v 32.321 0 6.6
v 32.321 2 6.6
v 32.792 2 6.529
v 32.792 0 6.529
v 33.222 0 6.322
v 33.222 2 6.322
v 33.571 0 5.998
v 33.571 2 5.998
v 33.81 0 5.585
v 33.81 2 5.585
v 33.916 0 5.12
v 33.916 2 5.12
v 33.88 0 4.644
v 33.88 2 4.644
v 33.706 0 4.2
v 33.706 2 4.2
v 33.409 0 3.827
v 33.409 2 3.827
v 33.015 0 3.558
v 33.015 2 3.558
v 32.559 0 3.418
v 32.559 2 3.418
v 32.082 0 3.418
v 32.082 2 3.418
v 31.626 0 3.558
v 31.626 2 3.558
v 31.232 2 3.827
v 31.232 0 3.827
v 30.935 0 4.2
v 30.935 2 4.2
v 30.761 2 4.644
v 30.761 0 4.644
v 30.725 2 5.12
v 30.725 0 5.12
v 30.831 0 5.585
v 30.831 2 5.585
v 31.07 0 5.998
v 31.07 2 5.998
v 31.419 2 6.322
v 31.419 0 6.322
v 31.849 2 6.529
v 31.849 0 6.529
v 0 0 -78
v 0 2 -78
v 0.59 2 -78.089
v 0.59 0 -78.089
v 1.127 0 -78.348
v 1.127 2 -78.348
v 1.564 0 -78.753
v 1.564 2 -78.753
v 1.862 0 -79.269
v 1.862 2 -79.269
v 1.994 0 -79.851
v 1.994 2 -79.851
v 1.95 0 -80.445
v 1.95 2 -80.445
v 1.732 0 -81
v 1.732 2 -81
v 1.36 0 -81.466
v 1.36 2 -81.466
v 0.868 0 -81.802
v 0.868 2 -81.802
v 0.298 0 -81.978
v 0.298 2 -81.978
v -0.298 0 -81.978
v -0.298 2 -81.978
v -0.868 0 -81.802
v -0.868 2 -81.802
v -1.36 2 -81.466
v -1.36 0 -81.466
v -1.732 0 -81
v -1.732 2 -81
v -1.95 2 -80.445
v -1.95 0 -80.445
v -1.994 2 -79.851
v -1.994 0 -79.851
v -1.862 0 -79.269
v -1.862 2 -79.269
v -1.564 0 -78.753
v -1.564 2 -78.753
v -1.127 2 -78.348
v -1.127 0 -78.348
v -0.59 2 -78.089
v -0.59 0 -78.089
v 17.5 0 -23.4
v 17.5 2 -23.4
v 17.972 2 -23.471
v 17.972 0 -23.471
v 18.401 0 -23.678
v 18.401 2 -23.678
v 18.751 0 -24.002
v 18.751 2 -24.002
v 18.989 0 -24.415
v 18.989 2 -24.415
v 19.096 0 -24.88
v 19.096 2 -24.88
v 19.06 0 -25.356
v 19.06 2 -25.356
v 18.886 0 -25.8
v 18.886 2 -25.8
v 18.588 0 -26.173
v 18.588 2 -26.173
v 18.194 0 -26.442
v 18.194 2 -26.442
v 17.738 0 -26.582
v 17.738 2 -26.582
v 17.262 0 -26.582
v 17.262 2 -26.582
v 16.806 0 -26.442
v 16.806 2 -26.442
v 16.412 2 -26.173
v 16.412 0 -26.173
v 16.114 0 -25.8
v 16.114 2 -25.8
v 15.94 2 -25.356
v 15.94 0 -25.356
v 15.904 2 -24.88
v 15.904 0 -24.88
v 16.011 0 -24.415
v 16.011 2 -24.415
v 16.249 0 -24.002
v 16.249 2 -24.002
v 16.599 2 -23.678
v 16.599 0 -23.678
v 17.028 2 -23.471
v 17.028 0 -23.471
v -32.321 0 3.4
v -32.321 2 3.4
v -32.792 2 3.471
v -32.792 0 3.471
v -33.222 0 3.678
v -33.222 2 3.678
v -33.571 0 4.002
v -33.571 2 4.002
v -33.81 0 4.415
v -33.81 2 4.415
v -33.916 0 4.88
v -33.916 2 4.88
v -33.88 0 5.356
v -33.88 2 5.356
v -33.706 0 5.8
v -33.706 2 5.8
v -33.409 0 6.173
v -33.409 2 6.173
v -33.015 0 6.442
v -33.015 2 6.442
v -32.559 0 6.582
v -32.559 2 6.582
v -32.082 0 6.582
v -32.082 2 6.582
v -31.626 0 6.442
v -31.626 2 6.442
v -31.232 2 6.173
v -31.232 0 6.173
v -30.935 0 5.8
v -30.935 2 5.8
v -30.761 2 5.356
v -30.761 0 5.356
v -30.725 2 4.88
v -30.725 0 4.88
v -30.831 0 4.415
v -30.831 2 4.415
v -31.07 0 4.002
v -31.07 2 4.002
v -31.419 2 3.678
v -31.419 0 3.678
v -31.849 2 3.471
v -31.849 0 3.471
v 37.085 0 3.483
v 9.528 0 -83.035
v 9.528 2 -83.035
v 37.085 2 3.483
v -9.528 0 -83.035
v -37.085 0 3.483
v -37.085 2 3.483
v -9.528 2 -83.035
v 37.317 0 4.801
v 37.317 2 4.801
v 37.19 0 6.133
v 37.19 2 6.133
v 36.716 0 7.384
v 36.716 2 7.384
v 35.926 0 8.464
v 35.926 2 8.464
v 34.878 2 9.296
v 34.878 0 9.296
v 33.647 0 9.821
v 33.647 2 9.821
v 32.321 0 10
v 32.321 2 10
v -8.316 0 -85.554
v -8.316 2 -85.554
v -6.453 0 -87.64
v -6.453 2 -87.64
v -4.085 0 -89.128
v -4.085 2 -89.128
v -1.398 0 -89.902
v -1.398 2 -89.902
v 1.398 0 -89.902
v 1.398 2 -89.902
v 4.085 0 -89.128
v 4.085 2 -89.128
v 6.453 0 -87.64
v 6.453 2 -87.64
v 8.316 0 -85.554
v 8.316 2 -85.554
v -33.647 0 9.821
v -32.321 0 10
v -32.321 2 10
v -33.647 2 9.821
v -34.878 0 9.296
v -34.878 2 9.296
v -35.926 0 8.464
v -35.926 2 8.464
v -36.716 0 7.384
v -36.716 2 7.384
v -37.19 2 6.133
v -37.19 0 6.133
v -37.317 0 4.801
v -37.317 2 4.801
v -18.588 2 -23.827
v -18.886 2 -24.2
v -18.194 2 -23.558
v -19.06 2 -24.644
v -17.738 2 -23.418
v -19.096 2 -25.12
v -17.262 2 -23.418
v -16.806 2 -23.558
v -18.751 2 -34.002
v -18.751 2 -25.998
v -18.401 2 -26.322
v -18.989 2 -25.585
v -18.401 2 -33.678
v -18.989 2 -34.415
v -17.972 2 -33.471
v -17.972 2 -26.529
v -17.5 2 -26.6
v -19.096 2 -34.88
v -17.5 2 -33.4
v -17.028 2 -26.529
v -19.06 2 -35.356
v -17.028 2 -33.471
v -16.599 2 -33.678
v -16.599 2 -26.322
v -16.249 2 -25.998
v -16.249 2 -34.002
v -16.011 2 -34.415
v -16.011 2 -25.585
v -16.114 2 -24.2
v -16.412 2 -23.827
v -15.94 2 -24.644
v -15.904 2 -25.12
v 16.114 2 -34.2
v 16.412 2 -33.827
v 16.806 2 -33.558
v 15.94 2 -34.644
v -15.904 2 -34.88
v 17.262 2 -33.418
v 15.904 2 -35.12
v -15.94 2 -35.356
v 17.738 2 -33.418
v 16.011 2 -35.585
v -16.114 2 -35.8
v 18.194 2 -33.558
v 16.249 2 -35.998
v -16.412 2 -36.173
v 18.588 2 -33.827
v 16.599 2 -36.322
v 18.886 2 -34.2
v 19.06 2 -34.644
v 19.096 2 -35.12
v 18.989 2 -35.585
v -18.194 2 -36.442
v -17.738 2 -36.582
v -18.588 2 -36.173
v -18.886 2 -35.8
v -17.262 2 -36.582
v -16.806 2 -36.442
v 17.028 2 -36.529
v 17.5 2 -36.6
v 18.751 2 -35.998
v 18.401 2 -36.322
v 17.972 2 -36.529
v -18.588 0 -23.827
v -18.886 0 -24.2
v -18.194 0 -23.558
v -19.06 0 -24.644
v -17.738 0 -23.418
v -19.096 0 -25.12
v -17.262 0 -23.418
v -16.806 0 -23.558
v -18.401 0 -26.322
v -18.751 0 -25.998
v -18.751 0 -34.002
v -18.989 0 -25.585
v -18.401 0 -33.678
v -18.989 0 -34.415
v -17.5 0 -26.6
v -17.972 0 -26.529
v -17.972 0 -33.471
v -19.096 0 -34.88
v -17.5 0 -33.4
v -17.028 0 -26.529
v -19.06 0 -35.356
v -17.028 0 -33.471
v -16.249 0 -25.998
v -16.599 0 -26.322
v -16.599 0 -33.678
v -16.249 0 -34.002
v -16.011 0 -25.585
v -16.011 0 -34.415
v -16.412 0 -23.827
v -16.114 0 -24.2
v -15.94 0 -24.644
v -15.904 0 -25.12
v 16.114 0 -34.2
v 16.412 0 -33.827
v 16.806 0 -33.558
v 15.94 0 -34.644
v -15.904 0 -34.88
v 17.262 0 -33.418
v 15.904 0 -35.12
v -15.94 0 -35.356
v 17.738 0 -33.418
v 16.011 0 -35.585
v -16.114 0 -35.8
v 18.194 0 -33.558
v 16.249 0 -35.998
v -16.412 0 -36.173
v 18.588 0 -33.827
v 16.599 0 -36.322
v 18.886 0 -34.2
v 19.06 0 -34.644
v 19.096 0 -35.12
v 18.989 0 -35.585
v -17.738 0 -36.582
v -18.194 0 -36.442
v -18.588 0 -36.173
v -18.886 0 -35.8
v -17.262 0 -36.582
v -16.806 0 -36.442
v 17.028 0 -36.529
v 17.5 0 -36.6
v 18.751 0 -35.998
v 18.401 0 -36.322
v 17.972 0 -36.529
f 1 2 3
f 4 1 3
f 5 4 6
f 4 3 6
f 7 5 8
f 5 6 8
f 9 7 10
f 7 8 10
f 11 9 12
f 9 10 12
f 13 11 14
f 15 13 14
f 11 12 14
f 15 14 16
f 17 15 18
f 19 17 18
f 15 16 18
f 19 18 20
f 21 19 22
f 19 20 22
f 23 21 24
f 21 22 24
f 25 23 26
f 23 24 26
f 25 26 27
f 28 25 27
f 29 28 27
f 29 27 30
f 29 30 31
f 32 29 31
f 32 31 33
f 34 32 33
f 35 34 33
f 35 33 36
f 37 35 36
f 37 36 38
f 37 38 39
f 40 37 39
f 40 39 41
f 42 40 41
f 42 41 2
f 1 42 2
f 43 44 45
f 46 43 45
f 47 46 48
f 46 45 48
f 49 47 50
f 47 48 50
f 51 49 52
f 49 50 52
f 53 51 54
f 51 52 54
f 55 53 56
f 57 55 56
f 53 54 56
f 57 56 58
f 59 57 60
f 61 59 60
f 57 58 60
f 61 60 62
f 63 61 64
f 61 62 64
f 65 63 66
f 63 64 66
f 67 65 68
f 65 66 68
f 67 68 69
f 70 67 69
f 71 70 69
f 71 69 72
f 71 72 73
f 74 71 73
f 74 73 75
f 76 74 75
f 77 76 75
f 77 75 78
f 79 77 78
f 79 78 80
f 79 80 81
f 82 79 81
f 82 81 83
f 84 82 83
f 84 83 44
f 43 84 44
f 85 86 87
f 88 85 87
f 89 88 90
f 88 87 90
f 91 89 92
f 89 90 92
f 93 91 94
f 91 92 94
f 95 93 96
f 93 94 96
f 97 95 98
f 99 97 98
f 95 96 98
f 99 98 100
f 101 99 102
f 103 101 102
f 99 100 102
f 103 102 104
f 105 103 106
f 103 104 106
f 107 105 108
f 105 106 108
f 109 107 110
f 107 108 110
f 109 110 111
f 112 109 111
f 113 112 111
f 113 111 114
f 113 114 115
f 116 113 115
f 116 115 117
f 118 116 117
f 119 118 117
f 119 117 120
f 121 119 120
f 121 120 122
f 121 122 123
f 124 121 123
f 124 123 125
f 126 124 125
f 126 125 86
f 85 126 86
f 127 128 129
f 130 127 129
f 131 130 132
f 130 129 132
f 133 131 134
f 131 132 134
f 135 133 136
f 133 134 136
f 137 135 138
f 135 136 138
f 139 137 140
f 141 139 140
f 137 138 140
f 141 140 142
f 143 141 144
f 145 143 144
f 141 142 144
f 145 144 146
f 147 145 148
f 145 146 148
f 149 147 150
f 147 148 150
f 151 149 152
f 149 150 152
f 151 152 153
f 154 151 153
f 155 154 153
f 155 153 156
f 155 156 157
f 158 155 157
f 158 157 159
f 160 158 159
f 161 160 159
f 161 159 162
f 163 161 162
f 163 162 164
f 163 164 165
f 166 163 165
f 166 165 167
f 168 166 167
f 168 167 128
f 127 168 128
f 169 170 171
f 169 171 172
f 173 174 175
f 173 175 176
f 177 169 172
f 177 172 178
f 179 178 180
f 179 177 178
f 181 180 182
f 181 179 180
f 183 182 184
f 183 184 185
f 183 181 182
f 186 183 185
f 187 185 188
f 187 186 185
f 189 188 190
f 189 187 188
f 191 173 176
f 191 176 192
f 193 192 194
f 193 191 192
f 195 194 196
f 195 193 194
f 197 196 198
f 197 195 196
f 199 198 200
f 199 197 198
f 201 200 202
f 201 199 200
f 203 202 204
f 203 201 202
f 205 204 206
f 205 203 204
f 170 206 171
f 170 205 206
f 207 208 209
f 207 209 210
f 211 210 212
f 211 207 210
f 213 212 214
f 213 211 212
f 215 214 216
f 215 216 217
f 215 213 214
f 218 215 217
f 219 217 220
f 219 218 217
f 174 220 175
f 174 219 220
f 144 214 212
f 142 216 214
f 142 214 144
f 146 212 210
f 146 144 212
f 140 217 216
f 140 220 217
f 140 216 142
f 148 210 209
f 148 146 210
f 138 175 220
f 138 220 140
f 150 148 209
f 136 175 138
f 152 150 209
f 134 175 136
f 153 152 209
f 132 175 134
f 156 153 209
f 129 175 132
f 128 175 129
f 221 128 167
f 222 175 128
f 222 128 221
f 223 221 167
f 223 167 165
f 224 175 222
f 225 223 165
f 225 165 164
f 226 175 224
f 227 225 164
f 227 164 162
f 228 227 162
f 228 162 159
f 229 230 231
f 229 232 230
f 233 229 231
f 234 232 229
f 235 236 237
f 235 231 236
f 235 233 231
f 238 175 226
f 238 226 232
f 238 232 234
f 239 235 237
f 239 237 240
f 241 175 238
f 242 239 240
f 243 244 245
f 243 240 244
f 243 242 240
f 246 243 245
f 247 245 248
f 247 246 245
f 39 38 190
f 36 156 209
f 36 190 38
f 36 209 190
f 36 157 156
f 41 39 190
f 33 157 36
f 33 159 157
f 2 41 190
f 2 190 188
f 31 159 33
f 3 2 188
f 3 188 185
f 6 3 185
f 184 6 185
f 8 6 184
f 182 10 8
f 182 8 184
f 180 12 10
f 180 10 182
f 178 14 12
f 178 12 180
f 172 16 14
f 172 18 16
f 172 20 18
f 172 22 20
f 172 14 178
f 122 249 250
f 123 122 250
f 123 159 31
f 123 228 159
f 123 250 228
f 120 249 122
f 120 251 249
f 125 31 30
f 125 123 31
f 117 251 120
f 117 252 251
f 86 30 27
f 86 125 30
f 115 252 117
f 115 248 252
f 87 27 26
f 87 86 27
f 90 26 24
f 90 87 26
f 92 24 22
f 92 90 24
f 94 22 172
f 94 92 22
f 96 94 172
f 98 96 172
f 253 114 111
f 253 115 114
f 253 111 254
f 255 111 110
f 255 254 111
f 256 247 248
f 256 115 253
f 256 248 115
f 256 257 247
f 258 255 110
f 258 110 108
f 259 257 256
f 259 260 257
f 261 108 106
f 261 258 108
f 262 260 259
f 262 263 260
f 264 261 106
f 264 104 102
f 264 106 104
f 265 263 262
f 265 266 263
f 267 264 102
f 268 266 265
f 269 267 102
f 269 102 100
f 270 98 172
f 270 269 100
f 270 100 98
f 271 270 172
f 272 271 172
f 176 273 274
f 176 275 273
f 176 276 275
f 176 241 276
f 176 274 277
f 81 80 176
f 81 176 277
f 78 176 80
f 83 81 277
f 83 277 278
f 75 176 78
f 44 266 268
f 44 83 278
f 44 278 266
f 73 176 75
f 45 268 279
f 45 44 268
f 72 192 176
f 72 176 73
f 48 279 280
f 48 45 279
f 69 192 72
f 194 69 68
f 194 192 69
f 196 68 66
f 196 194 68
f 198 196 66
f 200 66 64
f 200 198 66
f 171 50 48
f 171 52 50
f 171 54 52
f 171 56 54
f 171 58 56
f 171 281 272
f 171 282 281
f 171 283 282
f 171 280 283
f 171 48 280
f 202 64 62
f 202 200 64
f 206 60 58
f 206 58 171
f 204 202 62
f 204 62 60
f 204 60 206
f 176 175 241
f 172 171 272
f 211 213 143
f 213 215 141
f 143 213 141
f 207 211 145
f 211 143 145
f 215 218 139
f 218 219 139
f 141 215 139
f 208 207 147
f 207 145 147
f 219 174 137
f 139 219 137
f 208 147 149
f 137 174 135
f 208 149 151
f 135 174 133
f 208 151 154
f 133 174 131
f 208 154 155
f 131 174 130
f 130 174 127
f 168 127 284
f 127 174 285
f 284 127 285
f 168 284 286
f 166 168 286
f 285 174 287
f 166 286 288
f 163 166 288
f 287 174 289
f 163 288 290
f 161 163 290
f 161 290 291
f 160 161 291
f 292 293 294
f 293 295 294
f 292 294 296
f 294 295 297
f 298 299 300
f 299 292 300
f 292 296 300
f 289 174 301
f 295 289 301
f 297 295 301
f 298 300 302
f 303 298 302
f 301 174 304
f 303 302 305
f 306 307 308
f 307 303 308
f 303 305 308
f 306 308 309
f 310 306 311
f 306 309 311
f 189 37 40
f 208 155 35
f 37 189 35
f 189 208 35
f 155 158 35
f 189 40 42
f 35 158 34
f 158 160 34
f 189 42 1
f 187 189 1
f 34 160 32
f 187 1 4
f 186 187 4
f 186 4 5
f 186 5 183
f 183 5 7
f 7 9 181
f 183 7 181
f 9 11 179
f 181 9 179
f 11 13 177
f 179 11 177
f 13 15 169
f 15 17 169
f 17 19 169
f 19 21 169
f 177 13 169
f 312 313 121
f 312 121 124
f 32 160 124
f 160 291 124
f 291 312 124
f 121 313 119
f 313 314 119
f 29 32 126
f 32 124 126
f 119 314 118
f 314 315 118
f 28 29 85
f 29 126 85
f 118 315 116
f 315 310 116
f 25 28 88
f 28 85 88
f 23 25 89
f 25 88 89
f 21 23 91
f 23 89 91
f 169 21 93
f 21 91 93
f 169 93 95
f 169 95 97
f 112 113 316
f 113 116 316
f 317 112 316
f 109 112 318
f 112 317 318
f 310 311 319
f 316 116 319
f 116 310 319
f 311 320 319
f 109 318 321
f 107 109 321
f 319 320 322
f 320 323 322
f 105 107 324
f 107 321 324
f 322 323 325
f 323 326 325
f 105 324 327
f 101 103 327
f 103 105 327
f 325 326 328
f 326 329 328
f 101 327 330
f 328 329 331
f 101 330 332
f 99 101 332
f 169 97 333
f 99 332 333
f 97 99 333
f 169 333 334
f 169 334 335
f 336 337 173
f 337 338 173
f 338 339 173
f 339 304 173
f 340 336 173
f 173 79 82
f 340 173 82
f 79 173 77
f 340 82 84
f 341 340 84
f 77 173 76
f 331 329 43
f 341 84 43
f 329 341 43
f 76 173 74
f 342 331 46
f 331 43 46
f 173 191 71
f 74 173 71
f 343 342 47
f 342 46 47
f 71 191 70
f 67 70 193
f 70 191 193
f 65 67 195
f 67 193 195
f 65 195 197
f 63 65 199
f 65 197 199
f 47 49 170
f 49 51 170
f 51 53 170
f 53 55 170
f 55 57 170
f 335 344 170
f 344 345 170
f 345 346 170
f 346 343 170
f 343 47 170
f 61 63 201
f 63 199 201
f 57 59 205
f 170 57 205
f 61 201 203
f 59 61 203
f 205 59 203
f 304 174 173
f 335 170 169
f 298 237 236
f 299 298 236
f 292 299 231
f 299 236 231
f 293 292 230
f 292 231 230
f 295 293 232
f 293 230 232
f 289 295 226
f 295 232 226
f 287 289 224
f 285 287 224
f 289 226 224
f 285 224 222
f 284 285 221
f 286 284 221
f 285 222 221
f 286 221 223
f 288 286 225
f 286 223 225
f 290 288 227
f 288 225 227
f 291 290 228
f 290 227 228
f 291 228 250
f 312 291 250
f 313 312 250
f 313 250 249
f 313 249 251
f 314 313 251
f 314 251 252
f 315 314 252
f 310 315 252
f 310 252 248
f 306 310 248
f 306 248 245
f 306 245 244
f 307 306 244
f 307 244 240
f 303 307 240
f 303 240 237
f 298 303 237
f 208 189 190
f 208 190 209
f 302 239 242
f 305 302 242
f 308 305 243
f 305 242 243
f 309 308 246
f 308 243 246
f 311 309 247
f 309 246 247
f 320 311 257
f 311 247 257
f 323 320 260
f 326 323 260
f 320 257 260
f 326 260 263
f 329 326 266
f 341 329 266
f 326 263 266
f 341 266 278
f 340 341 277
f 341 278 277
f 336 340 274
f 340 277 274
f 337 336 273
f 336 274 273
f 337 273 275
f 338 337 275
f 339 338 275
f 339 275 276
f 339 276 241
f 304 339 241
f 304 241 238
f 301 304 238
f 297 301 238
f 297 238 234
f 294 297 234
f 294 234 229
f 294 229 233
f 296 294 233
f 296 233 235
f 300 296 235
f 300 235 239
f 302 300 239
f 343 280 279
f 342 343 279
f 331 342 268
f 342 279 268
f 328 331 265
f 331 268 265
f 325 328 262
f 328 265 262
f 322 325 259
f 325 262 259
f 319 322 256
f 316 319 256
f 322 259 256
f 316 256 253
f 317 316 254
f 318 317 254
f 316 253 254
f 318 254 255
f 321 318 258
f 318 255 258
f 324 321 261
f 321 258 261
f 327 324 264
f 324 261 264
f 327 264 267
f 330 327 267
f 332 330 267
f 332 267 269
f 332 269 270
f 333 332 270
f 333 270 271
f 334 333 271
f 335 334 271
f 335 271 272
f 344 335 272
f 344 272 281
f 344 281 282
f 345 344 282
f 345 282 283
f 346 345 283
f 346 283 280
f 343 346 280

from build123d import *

# Parameters (mm, degrees)
SKETCH_1_W              = 150
SKETCH_1_H              = 200
EXTRUDE_1_DEPTH         = 2
CUT_EXTRUDE_1_REACH     = 127.016
SKETCH_2_R              = 2
CUT_EXTRUDE_2_REACH     = 127.016
SKETCH_3_R              = 1.6
CUT_EXTRUDE_3_REACH     = 127.016
SKETCH_5_R              = 1.6
CUT_EXTRUDE_START       = -2
CUT_EXTRUDE_4_OUTLINE_W = 150
CUT_EXTRUDE_4_OUTLINE_H = 200
CUT_EXTRUDE_4_DEPTH     = 2


# Read off the part's stored shape, not the designer's step: 切除-拉伸4
with BuildPart() as part:
    # 草图1 → 凸台-拉伸1 (new body)
    with BuildSketch(Plane(origin=(0, 0, 0), x_dir=(1, 0, 0), z_dir=(0, 1, 0))):
        Rectangle(SKETCH_1_W, SKETCH_1_H)
    extrude(amount=EXTRUDE_1_DEPTH)

    # 草图2 → 切除-拉伸1 (cut, up to next)
    with BuildSketch(Plane(origin=(0, 2, 0), x_dir=(1, 0, 0), z_dir=(0, 1, 0)), mode=Mode.PRIVATE) as cut_extrude_1_sk1:
        with Locations(Location((0, 80, 0), (0, 0, 270))):
            Circle(SKETCH_2_R)
    cut_extrude_1_tool1 = extrude(cut_extrude_1_sk1.sketch, amount=-CUT_EXTRUDE_1_REACH, mode=Mode.PRIVATE) & part.part
    add(cut_extrude_1_tool1.solids().sort_by_distance((0, 2, -80))[0], mode=Mode.SUBTRACT)

    # 草图3 → 切除-拉伸2 (cut, up to next)
    with BuildSketch(Plane(origin=(0, 2, 0), x_dir=(1, 0, 0), z_dir=(0, 1, 0)), mode=Mode.PRIVATE) as cut_extrude_2_sk1:
        with Locations(Location((-17.5, 35, 0), (0, 0, 270))):
            Circle(SKETCH_3_R)
    cut_extrude_2_tool1 = extrude(cut_extrude_2_sk1.sketch, amount=-CUT_EXTRUDE_2_REACH, mode=Mode.PRIVATE) & part.part
    # 草图3 → 切除-拉伸2 (cut, up to next)
    with BuildSketch(Plane(origin=(0, 2, 0), x_dir=(1, 0, 0), z_dir=(0, 1, 0)), mode=Mode.PRIVATE) as cut_extrude_2_sk2:
        with Locations(Location((-17.5, 25, 0), (0, 0, 90))):
            Circle(SKETCH_3_R)
    cut_extrude_2_tool2 = extrude(cut_extrude_2_sk2.sketch, amount=-CUT_EXTRUDE_2_REACH, mode=Mode.PRIVATE) & part.part
    # 草图3 → 切除-拉伸2 (cut, up to next)
    with BuildSketch(Plane(origin=(0, 2, 0), x_dir=(1, 0, 0), z_dir=(0, 1, 0)), mode=Mode.PRIVATE) as cut_extrude_2_sk3:
        with Locations(Location((17.5, 25, 0), (0, 0, 270))):
            Circle(SKETCH_3_R)
    cut_extrude_2_tool3 = extrude(cut_extrude_2_sk3.sketch, amount=-CUT_EXTRUDE_2_REACH, mode=Mode.PRIVATE) & part.part
    # 草图3 → 切除-拉伸2 (cut, up to next)
    with BuildSketch(Plane(origin=(0, 2, 0), x_dir=(1, 0, 0), z_dir=(0, 1, 0)), mode=Mode.PRIVATE) as cut_extrude_2_sk4:
        with Locations(Location((17.5, 35, 0), (0, 0, 90))):
            Circle(SKETCH_3_R)
    cut_extrude_2_tool4 = extrude(cut_extrude_2_sk4.sketch, amount=-CUT_EXTRUDE_2_REACH, mode=Mode.PRIVATE) & part.part
    add(cut_extrude_2_tool1.solids().sort_by_distance((-17.5, 2, -35))[0], mode=Mode.SUBTRACT)
    add(cut_extrude_2_tool2.solids().sort_by_distance((-17.5, 2, -25))[0], mode=Mode.SUBTRACT)
    add(cut_extrude_2_tool3.solids().sort_by_distance((17.5, 2, -25))[0], mode=Mode.SUBTRACT)
    add(cut_extrude_2_tool4.solids().sort_by_distance((17.5, 2, -35))[0], mode=Mode.SUBTRACT)

    # 草图5 → 切除-拉伸3 (cut, up to next)
    with BuildSketch(Plane(origin=(0, 2, 0), x_dir=(1, 0, 0), z_dir=(0, 1, 0)), mode=Mode.PRIVATE) as cut_extrude_3_sk1:
        with Locations(Location((32.32051615, -5, 0), (0, 0, 270))):
            Circle(SKETCH_5_R)
    cut_extrude_3_tool1 = extrude(cut_extrude_3_sk1.sketch, amount=-CUT_EXTRUDE_3_REACH, mode=Mode.PRIVATE) & part.part
    # 草图5 → 切除-拉伸3 (cut, up to next)
    with BuildSketch(Plane(origin=(0, 2, 0), x_dir=(1, 0, 0), z_dir=(0, 1, 0)), mode=Mode.PRIVATE) as cut_extrude_3_sk2:
        with Locations(Location((-32.32051615, -5, 0), (0, 0, 90))):
            Circle(SKETCH_5_R)
    cut_extrude_3_tool2 = extrude(cut_extrude_3_sk2.sketch, amount=-CUT_EXTRUDE_3_REACH, mode=Mode.PRIVATE) & part.part
    add(cut_extrude_3_tool1.solids().sort_by_distance((32.320516, 2, 5))[0], mode=Mode.SUBTRACT)
    add(cut_extrude_3_tool2.solids().sort_by_distance((-32.320516, 2, 5))[0], mode=Mode.SUBTRACT)

    # 切除-拉伸4 outline → 切除-拉伸4 (cut)
    with BuildSketch(Plane(origin=(0, 2, 0), x_dir=(1, 0, 0), z_dir=(0, 1, 0)).offset(CUT_EXTRUDE_START)):
        Rectangle(CUT_EXTRUDE_4_OUTLINE_W, CUT_EXTRUDE_4_OUTLINE_H)
        with BuildLine():
            ThreePointArc((-9.52836439, 83.034843002), (0, 90), (9.52836439, 83.034843002))
            Line((9.52836439, 83.034843002), (37.084698345, -3.482578499))
            ThreePointArc((37.084698345, -3.482578499), (36.357043587, -7.95066878), (32.32051615, -10))
            Line((32.32051615, -10), (-32.32051615, -10))
            ThreePointArc((-32.32051615, -10), (-36.357043587, -7.95066878), (-37.084698345, -3.482578499))
            Line((-37.084698345, -3.482578499), (-9.52836439, 83.034843002))
        make_face(mode=Mode.SUBTRACT)
    extrude(amount=CUT_EXTRUDE_4_DEPTH, mode=Mode.SUBTRACT)


solid = part.part
